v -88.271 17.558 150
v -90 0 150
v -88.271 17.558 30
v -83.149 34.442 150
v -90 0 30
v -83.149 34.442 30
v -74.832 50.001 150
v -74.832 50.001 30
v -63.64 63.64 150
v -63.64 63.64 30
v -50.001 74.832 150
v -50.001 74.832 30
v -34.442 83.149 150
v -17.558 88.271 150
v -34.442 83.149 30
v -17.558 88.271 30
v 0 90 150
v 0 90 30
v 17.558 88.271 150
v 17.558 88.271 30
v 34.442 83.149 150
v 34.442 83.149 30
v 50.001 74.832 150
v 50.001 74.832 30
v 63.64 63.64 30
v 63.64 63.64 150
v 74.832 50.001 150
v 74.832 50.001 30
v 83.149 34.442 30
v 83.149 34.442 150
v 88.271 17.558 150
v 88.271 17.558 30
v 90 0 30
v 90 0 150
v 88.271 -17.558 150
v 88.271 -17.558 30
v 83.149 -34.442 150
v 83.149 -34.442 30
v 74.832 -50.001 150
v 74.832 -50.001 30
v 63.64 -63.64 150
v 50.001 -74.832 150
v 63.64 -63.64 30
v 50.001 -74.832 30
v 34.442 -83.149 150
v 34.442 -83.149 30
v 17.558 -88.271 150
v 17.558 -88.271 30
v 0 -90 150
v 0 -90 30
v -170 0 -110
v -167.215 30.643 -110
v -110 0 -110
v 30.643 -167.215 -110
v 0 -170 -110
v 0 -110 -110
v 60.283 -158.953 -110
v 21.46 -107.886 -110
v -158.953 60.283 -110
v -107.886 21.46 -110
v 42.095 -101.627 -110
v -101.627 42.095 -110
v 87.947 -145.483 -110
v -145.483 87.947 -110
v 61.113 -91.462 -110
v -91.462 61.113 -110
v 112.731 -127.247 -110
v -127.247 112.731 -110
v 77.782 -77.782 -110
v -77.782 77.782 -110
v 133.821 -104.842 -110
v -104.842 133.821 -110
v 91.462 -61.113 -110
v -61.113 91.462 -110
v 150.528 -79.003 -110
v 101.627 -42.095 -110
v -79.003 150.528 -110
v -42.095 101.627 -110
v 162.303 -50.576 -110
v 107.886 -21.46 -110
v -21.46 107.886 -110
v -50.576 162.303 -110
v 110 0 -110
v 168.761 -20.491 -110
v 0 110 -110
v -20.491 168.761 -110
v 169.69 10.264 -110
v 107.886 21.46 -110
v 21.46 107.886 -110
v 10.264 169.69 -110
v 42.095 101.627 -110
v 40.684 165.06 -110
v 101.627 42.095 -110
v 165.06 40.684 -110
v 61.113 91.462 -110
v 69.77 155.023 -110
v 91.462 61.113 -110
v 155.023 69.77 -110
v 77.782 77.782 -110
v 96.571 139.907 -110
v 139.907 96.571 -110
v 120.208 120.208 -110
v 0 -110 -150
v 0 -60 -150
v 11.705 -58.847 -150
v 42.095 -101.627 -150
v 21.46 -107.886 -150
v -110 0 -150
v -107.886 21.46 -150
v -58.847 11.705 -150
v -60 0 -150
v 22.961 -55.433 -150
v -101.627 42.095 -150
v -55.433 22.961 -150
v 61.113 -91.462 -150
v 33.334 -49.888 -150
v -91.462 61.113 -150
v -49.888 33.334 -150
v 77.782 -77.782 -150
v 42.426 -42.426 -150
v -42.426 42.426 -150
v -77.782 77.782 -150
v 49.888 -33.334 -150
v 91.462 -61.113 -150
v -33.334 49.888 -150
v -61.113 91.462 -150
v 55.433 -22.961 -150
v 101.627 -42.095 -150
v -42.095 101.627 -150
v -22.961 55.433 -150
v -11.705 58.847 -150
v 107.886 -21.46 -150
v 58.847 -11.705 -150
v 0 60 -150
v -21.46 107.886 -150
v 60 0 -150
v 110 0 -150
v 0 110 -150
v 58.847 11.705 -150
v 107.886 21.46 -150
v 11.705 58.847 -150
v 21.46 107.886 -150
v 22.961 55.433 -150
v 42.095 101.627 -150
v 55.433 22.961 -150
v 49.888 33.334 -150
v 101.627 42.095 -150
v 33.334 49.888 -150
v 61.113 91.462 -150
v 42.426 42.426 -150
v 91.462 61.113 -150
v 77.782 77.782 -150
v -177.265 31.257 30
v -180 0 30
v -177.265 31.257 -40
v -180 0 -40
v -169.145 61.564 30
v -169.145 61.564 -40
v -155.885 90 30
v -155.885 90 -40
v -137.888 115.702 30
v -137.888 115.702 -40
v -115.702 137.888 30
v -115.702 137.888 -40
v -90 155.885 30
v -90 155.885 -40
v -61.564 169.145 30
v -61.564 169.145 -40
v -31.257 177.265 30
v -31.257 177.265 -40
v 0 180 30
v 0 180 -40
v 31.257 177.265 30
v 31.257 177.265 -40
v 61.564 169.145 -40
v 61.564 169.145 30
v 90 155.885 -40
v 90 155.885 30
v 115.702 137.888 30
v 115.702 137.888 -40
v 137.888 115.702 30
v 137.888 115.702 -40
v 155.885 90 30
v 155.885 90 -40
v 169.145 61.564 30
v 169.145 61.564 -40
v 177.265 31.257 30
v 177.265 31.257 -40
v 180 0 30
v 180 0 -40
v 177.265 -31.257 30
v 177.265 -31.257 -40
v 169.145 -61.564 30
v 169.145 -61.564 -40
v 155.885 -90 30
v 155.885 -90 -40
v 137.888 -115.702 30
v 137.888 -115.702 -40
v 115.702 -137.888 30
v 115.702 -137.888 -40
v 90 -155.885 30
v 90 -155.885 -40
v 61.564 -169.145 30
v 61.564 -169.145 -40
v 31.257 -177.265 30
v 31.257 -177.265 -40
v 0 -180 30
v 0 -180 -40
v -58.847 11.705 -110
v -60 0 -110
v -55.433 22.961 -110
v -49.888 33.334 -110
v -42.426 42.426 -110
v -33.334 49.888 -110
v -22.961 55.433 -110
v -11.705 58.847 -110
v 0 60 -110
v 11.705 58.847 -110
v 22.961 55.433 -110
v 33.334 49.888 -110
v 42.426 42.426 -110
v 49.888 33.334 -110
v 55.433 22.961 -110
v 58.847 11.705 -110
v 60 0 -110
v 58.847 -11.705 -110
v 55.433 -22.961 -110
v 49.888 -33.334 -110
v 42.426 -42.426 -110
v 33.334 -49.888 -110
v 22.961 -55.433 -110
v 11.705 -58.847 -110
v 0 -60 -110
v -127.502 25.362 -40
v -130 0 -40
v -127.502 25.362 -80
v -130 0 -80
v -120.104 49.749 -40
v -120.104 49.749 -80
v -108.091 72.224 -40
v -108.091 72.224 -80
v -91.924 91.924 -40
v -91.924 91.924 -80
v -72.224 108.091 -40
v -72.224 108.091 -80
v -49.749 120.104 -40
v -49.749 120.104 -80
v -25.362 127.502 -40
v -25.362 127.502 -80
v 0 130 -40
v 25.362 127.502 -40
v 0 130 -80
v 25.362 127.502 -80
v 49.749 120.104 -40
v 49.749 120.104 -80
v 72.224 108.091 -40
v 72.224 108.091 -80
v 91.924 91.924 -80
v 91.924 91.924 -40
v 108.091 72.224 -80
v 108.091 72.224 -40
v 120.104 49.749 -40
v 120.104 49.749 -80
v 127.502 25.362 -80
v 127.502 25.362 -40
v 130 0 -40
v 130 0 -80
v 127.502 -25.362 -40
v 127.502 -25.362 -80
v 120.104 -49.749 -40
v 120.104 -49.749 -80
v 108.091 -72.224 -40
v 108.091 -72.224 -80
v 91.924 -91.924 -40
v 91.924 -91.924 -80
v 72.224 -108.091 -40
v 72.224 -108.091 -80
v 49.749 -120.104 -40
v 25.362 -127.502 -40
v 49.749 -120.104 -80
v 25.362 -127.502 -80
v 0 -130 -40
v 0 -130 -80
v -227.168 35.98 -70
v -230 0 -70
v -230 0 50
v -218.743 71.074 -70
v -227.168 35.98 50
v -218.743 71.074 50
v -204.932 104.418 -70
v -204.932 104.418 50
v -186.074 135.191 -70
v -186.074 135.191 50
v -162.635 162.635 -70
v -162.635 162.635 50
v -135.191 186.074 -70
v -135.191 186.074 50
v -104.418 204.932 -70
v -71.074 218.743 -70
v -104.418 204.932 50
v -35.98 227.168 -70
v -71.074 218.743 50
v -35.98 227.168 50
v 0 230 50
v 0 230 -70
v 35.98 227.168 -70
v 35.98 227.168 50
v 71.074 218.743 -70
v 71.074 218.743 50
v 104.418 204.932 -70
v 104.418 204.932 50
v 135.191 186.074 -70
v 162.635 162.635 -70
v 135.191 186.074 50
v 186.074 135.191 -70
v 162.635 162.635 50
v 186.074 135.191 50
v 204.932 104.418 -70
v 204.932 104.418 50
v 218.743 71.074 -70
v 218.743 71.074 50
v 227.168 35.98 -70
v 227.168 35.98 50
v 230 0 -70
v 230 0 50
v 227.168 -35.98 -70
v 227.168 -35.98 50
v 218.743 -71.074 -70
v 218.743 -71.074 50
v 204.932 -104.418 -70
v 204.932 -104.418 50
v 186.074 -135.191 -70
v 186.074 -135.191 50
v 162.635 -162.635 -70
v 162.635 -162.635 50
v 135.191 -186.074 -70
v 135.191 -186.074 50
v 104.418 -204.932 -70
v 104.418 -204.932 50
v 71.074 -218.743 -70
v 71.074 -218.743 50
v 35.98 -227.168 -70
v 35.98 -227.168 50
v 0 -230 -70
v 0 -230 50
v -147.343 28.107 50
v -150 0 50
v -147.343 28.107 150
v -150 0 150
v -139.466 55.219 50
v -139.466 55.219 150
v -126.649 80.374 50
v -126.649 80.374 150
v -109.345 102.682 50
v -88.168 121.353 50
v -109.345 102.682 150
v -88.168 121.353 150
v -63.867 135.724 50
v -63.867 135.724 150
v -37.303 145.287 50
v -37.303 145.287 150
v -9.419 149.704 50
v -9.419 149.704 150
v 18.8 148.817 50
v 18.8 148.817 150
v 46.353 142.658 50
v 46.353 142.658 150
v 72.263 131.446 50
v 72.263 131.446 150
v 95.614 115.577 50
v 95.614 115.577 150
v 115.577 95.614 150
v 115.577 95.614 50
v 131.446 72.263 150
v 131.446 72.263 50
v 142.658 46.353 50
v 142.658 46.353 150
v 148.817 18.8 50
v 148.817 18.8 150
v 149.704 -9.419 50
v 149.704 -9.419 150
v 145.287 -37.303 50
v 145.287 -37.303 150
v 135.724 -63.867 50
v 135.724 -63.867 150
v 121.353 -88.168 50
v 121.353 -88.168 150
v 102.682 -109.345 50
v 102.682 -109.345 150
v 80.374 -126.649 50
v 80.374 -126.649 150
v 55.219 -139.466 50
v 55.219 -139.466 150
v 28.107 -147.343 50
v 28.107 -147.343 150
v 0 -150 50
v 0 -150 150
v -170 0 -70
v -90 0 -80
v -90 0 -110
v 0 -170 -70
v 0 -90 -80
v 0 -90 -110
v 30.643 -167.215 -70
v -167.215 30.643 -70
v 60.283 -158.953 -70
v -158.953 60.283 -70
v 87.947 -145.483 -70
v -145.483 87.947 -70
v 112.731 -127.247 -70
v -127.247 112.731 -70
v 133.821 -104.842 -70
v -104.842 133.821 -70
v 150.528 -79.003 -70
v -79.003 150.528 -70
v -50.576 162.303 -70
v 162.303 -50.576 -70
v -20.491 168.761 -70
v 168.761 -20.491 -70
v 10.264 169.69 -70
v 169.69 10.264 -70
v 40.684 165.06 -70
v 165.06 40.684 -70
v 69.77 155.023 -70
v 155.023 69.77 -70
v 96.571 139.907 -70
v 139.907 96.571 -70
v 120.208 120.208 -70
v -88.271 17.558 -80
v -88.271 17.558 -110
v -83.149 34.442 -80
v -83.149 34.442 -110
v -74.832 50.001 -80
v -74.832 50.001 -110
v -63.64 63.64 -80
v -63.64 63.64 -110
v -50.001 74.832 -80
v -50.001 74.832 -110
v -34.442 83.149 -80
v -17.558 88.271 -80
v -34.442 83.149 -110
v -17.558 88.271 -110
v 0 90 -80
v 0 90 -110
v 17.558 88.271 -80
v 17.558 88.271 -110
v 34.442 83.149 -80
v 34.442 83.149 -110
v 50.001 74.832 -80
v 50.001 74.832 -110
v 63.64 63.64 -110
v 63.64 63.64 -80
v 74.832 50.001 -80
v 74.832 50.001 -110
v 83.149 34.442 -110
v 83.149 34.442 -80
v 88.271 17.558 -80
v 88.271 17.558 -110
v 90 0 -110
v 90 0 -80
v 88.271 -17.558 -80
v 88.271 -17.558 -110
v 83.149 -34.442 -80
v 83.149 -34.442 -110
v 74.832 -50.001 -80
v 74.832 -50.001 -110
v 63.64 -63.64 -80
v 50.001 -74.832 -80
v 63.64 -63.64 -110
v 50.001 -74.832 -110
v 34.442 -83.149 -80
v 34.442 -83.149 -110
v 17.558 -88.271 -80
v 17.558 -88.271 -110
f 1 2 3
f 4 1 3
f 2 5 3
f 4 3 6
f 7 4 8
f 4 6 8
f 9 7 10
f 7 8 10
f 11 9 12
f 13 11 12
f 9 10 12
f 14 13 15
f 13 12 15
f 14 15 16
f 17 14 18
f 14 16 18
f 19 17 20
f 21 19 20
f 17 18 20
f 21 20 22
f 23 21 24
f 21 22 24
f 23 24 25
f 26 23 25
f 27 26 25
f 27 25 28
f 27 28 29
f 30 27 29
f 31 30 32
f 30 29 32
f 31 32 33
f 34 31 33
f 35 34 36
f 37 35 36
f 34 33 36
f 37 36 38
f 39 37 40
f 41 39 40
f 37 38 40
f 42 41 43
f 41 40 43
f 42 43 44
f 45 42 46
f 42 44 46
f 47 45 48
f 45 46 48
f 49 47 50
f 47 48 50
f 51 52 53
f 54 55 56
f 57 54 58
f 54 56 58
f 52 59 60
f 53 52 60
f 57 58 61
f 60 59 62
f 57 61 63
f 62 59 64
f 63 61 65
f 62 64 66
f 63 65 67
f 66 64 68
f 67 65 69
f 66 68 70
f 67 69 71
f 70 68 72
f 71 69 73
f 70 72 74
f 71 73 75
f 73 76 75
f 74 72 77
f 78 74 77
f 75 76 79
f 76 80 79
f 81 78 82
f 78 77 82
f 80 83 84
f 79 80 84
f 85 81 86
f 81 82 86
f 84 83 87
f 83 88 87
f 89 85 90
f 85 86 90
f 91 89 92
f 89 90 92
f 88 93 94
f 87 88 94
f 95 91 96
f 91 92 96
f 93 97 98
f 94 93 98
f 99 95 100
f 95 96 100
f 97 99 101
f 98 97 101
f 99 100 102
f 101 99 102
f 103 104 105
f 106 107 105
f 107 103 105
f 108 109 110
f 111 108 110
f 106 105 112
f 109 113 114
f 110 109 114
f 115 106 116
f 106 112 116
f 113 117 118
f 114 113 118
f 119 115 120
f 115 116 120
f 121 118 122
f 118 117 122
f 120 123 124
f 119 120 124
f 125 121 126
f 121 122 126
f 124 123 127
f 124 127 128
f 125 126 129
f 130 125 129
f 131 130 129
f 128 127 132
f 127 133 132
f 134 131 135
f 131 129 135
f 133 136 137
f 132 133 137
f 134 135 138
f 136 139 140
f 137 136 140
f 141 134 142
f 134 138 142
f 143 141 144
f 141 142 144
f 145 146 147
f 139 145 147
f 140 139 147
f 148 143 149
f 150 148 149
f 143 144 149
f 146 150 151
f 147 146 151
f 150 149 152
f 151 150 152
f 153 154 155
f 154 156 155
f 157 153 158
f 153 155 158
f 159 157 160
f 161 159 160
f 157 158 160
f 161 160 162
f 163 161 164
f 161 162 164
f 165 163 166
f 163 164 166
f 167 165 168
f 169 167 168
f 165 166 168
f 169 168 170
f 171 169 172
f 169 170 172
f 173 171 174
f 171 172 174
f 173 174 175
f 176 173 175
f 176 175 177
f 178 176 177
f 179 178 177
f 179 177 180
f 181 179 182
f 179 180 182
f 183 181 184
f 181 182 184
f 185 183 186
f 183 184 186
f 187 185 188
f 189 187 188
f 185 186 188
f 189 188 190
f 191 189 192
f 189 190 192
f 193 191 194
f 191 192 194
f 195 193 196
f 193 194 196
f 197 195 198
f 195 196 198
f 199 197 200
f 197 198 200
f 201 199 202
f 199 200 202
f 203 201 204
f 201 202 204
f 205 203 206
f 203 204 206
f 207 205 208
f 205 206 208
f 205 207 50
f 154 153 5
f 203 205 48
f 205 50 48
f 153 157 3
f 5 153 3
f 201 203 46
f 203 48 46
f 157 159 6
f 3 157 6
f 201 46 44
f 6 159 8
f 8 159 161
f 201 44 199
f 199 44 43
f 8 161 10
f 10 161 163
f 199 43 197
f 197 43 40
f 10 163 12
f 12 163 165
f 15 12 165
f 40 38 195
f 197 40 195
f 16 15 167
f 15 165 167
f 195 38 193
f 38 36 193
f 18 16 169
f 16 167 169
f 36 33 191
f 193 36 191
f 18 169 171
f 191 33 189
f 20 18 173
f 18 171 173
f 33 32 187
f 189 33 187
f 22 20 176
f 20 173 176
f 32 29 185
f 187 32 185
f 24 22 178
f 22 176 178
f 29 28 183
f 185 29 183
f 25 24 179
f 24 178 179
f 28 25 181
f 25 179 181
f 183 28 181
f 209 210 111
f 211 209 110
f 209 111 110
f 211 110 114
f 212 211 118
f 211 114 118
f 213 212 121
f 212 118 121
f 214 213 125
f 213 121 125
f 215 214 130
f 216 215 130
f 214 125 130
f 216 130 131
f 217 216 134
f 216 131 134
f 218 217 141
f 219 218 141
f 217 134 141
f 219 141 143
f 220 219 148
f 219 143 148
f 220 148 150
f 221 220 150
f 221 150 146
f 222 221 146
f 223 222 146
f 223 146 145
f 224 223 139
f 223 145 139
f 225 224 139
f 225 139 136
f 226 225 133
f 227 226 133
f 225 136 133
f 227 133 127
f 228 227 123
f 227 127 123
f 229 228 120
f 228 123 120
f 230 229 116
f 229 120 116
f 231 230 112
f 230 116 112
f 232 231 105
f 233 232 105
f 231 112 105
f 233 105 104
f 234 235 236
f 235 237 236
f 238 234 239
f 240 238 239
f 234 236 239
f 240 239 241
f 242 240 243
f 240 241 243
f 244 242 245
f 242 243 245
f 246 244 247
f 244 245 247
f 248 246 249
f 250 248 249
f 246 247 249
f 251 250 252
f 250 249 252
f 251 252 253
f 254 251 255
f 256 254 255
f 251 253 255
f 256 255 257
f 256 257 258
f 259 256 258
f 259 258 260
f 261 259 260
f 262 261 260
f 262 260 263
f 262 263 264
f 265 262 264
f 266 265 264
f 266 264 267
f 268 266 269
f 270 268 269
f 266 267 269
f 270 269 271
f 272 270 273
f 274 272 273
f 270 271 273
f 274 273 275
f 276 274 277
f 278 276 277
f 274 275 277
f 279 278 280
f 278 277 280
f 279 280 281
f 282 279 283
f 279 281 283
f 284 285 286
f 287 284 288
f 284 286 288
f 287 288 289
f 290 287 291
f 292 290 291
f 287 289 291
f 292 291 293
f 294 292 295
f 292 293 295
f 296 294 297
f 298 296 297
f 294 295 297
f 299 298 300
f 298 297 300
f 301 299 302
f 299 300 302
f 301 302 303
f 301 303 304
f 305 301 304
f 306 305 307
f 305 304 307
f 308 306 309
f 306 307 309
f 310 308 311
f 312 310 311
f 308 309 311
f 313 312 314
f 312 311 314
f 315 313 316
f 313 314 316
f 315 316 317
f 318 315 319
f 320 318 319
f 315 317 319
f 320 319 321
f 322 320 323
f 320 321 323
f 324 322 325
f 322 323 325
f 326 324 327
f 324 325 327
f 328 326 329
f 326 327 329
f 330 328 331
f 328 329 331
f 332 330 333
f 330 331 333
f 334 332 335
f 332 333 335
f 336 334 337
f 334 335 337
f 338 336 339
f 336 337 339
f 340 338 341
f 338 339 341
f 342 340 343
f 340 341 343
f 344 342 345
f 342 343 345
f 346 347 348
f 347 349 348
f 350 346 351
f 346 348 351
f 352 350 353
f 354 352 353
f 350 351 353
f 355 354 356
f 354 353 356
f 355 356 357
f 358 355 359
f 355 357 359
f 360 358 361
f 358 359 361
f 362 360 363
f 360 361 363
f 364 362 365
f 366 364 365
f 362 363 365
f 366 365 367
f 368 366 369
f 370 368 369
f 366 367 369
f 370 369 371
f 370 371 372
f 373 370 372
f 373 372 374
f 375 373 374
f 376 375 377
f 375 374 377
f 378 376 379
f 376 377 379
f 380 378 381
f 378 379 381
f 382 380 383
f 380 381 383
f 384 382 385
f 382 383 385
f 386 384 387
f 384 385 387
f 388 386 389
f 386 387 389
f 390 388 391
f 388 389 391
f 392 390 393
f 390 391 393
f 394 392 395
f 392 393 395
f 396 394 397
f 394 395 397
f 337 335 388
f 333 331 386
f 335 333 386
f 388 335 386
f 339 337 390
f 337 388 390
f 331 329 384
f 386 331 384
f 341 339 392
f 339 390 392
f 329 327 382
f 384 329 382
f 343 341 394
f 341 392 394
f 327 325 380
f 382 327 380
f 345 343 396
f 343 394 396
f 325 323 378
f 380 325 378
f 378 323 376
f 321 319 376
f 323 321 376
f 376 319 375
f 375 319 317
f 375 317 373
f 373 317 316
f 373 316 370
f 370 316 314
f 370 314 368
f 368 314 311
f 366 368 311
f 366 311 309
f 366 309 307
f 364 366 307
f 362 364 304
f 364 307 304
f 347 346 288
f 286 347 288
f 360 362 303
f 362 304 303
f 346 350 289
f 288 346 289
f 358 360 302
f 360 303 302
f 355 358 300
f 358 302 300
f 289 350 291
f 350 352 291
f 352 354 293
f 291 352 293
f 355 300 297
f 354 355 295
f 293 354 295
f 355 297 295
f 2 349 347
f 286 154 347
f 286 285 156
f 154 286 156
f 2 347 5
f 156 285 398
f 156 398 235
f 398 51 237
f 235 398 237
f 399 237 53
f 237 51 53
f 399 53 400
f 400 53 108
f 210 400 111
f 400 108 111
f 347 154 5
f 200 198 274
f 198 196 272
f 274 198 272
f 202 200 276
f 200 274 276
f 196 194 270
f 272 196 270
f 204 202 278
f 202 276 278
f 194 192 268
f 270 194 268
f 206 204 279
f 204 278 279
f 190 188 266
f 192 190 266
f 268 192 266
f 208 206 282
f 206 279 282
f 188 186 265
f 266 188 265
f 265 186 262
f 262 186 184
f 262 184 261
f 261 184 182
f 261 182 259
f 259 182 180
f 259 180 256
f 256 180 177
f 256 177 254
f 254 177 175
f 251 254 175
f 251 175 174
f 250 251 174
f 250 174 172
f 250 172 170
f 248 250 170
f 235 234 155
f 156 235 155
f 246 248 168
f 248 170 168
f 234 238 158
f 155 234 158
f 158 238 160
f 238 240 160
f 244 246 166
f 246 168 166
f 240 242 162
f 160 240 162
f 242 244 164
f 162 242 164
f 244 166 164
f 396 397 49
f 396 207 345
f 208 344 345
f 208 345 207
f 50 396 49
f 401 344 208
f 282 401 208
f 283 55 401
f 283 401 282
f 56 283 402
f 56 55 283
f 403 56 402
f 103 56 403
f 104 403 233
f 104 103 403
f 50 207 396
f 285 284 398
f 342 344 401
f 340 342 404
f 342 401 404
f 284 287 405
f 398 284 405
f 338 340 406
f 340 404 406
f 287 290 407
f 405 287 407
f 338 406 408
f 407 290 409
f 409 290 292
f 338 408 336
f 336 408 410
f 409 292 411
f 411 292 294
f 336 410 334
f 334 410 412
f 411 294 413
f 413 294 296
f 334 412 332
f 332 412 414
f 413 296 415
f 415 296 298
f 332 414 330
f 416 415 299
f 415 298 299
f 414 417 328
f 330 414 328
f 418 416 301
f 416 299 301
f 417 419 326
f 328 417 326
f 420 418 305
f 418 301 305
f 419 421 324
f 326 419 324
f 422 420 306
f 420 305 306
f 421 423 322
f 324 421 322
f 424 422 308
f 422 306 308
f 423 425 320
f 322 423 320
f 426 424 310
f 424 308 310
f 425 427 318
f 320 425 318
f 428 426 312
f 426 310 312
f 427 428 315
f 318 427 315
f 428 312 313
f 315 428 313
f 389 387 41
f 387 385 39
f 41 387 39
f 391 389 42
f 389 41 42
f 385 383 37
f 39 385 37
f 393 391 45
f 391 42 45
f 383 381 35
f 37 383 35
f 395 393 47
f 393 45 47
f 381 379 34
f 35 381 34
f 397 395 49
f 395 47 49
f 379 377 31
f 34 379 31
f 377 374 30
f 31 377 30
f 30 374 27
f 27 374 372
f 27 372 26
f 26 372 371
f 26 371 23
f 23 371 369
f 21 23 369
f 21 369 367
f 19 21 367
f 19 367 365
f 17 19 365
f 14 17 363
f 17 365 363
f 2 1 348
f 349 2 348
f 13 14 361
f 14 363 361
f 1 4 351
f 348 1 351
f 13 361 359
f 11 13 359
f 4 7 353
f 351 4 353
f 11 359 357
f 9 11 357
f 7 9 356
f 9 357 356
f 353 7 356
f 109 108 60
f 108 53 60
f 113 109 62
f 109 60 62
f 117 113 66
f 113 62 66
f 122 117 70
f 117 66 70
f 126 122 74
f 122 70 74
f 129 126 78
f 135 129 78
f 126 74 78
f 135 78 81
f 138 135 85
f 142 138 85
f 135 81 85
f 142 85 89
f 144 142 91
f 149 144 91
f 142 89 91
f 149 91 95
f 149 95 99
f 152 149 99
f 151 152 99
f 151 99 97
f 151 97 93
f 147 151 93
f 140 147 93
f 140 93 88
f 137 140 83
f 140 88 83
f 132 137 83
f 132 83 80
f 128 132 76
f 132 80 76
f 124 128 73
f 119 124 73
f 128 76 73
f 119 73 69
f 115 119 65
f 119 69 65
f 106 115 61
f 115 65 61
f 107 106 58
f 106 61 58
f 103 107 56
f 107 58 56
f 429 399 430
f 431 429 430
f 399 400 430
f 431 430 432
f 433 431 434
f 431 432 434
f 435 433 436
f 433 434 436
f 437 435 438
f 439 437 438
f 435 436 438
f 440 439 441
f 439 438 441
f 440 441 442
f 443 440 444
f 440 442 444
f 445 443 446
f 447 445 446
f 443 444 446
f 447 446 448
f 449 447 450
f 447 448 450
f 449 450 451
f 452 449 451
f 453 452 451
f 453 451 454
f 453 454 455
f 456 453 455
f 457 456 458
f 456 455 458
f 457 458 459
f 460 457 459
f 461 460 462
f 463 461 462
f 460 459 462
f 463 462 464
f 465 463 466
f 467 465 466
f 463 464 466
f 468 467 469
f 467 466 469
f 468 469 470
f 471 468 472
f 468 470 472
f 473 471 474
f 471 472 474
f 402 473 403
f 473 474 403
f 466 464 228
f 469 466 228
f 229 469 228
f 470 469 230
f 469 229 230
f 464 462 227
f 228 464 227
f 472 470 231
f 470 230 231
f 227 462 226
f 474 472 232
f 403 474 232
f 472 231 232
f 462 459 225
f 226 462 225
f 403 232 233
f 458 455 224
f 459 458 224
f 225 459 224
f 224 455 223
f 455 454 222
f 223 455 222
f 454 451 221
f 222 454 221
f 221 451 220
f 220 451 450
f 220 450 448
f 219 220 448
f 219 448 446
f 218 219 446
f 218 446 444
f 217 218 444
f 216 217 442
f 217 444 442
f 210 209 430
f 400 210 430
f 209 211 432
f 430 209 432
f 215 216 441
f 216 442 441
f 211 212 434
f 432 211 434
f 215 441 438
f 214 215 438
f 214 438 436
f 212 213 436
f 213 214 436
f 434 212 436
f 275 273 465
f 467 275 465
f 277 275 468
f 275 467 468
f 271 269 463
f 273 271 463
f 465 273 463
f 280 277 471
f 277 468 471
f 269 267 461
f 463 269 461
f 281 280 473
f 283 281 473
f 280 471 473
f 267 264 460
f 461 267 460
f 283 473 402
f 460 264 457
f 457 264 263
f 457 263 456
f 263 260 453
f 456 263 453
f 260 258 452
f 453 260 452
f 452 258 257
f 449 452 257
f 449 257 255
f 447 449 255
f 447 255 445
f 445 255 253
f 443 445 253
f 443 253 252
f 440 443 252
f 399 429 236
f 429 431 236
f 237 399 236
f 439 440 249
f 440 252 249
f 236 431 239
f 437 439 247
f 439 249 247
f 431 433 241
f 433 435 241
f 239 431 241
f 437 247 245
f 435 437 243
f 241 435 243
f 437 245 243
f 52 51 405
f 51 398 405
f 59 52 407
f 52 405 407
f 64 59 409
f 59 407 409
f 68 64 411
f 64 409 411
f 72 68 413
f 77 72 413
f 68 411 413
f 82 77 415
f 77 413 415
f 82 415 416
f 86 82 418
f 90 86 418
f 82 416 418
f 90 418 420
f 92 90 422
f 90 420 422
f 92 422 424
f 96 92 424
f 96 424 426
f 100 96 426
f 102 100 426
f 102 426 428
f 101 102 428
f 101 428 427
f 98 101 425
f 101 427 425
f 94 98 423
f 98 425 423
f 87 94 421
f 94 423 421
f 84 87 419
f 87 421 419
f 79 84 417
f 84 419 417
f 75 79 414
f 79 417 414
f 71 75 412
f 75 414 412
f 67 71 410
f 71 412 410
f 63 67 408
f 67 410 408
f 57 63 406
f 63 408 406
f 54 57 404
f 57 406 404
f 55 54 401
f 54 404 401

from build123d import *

# Parameters (mm, degrees)
REVOLVE1_ANGLE = 270


with BuildPart() as part:
    # Sketch1 → Revolve1 (revolve)
    with BuildSketch(Plane(origin=(0, 0, 0), x_dir=(1, 0, 0), z_dir=(0, 1, 0))):
        Polygon((-60, 150), (-110, 150), (-110, 110), (-170, 110), (-170, 70), (-230, 70), (-230, -50), (-150, -50), (-150, -150), (-90, -150), (-90, -30), (-180, -30), (-180, 40), (-130, 40), (-130, 80), (-90, 80), (-90, 110), (-60, 110), align=None)
    revolve(axis=Axis((0, 0, 150), (0, 0, -1)), revolution_arc=REVOLVE1_ANGLE)


solid = part.part
